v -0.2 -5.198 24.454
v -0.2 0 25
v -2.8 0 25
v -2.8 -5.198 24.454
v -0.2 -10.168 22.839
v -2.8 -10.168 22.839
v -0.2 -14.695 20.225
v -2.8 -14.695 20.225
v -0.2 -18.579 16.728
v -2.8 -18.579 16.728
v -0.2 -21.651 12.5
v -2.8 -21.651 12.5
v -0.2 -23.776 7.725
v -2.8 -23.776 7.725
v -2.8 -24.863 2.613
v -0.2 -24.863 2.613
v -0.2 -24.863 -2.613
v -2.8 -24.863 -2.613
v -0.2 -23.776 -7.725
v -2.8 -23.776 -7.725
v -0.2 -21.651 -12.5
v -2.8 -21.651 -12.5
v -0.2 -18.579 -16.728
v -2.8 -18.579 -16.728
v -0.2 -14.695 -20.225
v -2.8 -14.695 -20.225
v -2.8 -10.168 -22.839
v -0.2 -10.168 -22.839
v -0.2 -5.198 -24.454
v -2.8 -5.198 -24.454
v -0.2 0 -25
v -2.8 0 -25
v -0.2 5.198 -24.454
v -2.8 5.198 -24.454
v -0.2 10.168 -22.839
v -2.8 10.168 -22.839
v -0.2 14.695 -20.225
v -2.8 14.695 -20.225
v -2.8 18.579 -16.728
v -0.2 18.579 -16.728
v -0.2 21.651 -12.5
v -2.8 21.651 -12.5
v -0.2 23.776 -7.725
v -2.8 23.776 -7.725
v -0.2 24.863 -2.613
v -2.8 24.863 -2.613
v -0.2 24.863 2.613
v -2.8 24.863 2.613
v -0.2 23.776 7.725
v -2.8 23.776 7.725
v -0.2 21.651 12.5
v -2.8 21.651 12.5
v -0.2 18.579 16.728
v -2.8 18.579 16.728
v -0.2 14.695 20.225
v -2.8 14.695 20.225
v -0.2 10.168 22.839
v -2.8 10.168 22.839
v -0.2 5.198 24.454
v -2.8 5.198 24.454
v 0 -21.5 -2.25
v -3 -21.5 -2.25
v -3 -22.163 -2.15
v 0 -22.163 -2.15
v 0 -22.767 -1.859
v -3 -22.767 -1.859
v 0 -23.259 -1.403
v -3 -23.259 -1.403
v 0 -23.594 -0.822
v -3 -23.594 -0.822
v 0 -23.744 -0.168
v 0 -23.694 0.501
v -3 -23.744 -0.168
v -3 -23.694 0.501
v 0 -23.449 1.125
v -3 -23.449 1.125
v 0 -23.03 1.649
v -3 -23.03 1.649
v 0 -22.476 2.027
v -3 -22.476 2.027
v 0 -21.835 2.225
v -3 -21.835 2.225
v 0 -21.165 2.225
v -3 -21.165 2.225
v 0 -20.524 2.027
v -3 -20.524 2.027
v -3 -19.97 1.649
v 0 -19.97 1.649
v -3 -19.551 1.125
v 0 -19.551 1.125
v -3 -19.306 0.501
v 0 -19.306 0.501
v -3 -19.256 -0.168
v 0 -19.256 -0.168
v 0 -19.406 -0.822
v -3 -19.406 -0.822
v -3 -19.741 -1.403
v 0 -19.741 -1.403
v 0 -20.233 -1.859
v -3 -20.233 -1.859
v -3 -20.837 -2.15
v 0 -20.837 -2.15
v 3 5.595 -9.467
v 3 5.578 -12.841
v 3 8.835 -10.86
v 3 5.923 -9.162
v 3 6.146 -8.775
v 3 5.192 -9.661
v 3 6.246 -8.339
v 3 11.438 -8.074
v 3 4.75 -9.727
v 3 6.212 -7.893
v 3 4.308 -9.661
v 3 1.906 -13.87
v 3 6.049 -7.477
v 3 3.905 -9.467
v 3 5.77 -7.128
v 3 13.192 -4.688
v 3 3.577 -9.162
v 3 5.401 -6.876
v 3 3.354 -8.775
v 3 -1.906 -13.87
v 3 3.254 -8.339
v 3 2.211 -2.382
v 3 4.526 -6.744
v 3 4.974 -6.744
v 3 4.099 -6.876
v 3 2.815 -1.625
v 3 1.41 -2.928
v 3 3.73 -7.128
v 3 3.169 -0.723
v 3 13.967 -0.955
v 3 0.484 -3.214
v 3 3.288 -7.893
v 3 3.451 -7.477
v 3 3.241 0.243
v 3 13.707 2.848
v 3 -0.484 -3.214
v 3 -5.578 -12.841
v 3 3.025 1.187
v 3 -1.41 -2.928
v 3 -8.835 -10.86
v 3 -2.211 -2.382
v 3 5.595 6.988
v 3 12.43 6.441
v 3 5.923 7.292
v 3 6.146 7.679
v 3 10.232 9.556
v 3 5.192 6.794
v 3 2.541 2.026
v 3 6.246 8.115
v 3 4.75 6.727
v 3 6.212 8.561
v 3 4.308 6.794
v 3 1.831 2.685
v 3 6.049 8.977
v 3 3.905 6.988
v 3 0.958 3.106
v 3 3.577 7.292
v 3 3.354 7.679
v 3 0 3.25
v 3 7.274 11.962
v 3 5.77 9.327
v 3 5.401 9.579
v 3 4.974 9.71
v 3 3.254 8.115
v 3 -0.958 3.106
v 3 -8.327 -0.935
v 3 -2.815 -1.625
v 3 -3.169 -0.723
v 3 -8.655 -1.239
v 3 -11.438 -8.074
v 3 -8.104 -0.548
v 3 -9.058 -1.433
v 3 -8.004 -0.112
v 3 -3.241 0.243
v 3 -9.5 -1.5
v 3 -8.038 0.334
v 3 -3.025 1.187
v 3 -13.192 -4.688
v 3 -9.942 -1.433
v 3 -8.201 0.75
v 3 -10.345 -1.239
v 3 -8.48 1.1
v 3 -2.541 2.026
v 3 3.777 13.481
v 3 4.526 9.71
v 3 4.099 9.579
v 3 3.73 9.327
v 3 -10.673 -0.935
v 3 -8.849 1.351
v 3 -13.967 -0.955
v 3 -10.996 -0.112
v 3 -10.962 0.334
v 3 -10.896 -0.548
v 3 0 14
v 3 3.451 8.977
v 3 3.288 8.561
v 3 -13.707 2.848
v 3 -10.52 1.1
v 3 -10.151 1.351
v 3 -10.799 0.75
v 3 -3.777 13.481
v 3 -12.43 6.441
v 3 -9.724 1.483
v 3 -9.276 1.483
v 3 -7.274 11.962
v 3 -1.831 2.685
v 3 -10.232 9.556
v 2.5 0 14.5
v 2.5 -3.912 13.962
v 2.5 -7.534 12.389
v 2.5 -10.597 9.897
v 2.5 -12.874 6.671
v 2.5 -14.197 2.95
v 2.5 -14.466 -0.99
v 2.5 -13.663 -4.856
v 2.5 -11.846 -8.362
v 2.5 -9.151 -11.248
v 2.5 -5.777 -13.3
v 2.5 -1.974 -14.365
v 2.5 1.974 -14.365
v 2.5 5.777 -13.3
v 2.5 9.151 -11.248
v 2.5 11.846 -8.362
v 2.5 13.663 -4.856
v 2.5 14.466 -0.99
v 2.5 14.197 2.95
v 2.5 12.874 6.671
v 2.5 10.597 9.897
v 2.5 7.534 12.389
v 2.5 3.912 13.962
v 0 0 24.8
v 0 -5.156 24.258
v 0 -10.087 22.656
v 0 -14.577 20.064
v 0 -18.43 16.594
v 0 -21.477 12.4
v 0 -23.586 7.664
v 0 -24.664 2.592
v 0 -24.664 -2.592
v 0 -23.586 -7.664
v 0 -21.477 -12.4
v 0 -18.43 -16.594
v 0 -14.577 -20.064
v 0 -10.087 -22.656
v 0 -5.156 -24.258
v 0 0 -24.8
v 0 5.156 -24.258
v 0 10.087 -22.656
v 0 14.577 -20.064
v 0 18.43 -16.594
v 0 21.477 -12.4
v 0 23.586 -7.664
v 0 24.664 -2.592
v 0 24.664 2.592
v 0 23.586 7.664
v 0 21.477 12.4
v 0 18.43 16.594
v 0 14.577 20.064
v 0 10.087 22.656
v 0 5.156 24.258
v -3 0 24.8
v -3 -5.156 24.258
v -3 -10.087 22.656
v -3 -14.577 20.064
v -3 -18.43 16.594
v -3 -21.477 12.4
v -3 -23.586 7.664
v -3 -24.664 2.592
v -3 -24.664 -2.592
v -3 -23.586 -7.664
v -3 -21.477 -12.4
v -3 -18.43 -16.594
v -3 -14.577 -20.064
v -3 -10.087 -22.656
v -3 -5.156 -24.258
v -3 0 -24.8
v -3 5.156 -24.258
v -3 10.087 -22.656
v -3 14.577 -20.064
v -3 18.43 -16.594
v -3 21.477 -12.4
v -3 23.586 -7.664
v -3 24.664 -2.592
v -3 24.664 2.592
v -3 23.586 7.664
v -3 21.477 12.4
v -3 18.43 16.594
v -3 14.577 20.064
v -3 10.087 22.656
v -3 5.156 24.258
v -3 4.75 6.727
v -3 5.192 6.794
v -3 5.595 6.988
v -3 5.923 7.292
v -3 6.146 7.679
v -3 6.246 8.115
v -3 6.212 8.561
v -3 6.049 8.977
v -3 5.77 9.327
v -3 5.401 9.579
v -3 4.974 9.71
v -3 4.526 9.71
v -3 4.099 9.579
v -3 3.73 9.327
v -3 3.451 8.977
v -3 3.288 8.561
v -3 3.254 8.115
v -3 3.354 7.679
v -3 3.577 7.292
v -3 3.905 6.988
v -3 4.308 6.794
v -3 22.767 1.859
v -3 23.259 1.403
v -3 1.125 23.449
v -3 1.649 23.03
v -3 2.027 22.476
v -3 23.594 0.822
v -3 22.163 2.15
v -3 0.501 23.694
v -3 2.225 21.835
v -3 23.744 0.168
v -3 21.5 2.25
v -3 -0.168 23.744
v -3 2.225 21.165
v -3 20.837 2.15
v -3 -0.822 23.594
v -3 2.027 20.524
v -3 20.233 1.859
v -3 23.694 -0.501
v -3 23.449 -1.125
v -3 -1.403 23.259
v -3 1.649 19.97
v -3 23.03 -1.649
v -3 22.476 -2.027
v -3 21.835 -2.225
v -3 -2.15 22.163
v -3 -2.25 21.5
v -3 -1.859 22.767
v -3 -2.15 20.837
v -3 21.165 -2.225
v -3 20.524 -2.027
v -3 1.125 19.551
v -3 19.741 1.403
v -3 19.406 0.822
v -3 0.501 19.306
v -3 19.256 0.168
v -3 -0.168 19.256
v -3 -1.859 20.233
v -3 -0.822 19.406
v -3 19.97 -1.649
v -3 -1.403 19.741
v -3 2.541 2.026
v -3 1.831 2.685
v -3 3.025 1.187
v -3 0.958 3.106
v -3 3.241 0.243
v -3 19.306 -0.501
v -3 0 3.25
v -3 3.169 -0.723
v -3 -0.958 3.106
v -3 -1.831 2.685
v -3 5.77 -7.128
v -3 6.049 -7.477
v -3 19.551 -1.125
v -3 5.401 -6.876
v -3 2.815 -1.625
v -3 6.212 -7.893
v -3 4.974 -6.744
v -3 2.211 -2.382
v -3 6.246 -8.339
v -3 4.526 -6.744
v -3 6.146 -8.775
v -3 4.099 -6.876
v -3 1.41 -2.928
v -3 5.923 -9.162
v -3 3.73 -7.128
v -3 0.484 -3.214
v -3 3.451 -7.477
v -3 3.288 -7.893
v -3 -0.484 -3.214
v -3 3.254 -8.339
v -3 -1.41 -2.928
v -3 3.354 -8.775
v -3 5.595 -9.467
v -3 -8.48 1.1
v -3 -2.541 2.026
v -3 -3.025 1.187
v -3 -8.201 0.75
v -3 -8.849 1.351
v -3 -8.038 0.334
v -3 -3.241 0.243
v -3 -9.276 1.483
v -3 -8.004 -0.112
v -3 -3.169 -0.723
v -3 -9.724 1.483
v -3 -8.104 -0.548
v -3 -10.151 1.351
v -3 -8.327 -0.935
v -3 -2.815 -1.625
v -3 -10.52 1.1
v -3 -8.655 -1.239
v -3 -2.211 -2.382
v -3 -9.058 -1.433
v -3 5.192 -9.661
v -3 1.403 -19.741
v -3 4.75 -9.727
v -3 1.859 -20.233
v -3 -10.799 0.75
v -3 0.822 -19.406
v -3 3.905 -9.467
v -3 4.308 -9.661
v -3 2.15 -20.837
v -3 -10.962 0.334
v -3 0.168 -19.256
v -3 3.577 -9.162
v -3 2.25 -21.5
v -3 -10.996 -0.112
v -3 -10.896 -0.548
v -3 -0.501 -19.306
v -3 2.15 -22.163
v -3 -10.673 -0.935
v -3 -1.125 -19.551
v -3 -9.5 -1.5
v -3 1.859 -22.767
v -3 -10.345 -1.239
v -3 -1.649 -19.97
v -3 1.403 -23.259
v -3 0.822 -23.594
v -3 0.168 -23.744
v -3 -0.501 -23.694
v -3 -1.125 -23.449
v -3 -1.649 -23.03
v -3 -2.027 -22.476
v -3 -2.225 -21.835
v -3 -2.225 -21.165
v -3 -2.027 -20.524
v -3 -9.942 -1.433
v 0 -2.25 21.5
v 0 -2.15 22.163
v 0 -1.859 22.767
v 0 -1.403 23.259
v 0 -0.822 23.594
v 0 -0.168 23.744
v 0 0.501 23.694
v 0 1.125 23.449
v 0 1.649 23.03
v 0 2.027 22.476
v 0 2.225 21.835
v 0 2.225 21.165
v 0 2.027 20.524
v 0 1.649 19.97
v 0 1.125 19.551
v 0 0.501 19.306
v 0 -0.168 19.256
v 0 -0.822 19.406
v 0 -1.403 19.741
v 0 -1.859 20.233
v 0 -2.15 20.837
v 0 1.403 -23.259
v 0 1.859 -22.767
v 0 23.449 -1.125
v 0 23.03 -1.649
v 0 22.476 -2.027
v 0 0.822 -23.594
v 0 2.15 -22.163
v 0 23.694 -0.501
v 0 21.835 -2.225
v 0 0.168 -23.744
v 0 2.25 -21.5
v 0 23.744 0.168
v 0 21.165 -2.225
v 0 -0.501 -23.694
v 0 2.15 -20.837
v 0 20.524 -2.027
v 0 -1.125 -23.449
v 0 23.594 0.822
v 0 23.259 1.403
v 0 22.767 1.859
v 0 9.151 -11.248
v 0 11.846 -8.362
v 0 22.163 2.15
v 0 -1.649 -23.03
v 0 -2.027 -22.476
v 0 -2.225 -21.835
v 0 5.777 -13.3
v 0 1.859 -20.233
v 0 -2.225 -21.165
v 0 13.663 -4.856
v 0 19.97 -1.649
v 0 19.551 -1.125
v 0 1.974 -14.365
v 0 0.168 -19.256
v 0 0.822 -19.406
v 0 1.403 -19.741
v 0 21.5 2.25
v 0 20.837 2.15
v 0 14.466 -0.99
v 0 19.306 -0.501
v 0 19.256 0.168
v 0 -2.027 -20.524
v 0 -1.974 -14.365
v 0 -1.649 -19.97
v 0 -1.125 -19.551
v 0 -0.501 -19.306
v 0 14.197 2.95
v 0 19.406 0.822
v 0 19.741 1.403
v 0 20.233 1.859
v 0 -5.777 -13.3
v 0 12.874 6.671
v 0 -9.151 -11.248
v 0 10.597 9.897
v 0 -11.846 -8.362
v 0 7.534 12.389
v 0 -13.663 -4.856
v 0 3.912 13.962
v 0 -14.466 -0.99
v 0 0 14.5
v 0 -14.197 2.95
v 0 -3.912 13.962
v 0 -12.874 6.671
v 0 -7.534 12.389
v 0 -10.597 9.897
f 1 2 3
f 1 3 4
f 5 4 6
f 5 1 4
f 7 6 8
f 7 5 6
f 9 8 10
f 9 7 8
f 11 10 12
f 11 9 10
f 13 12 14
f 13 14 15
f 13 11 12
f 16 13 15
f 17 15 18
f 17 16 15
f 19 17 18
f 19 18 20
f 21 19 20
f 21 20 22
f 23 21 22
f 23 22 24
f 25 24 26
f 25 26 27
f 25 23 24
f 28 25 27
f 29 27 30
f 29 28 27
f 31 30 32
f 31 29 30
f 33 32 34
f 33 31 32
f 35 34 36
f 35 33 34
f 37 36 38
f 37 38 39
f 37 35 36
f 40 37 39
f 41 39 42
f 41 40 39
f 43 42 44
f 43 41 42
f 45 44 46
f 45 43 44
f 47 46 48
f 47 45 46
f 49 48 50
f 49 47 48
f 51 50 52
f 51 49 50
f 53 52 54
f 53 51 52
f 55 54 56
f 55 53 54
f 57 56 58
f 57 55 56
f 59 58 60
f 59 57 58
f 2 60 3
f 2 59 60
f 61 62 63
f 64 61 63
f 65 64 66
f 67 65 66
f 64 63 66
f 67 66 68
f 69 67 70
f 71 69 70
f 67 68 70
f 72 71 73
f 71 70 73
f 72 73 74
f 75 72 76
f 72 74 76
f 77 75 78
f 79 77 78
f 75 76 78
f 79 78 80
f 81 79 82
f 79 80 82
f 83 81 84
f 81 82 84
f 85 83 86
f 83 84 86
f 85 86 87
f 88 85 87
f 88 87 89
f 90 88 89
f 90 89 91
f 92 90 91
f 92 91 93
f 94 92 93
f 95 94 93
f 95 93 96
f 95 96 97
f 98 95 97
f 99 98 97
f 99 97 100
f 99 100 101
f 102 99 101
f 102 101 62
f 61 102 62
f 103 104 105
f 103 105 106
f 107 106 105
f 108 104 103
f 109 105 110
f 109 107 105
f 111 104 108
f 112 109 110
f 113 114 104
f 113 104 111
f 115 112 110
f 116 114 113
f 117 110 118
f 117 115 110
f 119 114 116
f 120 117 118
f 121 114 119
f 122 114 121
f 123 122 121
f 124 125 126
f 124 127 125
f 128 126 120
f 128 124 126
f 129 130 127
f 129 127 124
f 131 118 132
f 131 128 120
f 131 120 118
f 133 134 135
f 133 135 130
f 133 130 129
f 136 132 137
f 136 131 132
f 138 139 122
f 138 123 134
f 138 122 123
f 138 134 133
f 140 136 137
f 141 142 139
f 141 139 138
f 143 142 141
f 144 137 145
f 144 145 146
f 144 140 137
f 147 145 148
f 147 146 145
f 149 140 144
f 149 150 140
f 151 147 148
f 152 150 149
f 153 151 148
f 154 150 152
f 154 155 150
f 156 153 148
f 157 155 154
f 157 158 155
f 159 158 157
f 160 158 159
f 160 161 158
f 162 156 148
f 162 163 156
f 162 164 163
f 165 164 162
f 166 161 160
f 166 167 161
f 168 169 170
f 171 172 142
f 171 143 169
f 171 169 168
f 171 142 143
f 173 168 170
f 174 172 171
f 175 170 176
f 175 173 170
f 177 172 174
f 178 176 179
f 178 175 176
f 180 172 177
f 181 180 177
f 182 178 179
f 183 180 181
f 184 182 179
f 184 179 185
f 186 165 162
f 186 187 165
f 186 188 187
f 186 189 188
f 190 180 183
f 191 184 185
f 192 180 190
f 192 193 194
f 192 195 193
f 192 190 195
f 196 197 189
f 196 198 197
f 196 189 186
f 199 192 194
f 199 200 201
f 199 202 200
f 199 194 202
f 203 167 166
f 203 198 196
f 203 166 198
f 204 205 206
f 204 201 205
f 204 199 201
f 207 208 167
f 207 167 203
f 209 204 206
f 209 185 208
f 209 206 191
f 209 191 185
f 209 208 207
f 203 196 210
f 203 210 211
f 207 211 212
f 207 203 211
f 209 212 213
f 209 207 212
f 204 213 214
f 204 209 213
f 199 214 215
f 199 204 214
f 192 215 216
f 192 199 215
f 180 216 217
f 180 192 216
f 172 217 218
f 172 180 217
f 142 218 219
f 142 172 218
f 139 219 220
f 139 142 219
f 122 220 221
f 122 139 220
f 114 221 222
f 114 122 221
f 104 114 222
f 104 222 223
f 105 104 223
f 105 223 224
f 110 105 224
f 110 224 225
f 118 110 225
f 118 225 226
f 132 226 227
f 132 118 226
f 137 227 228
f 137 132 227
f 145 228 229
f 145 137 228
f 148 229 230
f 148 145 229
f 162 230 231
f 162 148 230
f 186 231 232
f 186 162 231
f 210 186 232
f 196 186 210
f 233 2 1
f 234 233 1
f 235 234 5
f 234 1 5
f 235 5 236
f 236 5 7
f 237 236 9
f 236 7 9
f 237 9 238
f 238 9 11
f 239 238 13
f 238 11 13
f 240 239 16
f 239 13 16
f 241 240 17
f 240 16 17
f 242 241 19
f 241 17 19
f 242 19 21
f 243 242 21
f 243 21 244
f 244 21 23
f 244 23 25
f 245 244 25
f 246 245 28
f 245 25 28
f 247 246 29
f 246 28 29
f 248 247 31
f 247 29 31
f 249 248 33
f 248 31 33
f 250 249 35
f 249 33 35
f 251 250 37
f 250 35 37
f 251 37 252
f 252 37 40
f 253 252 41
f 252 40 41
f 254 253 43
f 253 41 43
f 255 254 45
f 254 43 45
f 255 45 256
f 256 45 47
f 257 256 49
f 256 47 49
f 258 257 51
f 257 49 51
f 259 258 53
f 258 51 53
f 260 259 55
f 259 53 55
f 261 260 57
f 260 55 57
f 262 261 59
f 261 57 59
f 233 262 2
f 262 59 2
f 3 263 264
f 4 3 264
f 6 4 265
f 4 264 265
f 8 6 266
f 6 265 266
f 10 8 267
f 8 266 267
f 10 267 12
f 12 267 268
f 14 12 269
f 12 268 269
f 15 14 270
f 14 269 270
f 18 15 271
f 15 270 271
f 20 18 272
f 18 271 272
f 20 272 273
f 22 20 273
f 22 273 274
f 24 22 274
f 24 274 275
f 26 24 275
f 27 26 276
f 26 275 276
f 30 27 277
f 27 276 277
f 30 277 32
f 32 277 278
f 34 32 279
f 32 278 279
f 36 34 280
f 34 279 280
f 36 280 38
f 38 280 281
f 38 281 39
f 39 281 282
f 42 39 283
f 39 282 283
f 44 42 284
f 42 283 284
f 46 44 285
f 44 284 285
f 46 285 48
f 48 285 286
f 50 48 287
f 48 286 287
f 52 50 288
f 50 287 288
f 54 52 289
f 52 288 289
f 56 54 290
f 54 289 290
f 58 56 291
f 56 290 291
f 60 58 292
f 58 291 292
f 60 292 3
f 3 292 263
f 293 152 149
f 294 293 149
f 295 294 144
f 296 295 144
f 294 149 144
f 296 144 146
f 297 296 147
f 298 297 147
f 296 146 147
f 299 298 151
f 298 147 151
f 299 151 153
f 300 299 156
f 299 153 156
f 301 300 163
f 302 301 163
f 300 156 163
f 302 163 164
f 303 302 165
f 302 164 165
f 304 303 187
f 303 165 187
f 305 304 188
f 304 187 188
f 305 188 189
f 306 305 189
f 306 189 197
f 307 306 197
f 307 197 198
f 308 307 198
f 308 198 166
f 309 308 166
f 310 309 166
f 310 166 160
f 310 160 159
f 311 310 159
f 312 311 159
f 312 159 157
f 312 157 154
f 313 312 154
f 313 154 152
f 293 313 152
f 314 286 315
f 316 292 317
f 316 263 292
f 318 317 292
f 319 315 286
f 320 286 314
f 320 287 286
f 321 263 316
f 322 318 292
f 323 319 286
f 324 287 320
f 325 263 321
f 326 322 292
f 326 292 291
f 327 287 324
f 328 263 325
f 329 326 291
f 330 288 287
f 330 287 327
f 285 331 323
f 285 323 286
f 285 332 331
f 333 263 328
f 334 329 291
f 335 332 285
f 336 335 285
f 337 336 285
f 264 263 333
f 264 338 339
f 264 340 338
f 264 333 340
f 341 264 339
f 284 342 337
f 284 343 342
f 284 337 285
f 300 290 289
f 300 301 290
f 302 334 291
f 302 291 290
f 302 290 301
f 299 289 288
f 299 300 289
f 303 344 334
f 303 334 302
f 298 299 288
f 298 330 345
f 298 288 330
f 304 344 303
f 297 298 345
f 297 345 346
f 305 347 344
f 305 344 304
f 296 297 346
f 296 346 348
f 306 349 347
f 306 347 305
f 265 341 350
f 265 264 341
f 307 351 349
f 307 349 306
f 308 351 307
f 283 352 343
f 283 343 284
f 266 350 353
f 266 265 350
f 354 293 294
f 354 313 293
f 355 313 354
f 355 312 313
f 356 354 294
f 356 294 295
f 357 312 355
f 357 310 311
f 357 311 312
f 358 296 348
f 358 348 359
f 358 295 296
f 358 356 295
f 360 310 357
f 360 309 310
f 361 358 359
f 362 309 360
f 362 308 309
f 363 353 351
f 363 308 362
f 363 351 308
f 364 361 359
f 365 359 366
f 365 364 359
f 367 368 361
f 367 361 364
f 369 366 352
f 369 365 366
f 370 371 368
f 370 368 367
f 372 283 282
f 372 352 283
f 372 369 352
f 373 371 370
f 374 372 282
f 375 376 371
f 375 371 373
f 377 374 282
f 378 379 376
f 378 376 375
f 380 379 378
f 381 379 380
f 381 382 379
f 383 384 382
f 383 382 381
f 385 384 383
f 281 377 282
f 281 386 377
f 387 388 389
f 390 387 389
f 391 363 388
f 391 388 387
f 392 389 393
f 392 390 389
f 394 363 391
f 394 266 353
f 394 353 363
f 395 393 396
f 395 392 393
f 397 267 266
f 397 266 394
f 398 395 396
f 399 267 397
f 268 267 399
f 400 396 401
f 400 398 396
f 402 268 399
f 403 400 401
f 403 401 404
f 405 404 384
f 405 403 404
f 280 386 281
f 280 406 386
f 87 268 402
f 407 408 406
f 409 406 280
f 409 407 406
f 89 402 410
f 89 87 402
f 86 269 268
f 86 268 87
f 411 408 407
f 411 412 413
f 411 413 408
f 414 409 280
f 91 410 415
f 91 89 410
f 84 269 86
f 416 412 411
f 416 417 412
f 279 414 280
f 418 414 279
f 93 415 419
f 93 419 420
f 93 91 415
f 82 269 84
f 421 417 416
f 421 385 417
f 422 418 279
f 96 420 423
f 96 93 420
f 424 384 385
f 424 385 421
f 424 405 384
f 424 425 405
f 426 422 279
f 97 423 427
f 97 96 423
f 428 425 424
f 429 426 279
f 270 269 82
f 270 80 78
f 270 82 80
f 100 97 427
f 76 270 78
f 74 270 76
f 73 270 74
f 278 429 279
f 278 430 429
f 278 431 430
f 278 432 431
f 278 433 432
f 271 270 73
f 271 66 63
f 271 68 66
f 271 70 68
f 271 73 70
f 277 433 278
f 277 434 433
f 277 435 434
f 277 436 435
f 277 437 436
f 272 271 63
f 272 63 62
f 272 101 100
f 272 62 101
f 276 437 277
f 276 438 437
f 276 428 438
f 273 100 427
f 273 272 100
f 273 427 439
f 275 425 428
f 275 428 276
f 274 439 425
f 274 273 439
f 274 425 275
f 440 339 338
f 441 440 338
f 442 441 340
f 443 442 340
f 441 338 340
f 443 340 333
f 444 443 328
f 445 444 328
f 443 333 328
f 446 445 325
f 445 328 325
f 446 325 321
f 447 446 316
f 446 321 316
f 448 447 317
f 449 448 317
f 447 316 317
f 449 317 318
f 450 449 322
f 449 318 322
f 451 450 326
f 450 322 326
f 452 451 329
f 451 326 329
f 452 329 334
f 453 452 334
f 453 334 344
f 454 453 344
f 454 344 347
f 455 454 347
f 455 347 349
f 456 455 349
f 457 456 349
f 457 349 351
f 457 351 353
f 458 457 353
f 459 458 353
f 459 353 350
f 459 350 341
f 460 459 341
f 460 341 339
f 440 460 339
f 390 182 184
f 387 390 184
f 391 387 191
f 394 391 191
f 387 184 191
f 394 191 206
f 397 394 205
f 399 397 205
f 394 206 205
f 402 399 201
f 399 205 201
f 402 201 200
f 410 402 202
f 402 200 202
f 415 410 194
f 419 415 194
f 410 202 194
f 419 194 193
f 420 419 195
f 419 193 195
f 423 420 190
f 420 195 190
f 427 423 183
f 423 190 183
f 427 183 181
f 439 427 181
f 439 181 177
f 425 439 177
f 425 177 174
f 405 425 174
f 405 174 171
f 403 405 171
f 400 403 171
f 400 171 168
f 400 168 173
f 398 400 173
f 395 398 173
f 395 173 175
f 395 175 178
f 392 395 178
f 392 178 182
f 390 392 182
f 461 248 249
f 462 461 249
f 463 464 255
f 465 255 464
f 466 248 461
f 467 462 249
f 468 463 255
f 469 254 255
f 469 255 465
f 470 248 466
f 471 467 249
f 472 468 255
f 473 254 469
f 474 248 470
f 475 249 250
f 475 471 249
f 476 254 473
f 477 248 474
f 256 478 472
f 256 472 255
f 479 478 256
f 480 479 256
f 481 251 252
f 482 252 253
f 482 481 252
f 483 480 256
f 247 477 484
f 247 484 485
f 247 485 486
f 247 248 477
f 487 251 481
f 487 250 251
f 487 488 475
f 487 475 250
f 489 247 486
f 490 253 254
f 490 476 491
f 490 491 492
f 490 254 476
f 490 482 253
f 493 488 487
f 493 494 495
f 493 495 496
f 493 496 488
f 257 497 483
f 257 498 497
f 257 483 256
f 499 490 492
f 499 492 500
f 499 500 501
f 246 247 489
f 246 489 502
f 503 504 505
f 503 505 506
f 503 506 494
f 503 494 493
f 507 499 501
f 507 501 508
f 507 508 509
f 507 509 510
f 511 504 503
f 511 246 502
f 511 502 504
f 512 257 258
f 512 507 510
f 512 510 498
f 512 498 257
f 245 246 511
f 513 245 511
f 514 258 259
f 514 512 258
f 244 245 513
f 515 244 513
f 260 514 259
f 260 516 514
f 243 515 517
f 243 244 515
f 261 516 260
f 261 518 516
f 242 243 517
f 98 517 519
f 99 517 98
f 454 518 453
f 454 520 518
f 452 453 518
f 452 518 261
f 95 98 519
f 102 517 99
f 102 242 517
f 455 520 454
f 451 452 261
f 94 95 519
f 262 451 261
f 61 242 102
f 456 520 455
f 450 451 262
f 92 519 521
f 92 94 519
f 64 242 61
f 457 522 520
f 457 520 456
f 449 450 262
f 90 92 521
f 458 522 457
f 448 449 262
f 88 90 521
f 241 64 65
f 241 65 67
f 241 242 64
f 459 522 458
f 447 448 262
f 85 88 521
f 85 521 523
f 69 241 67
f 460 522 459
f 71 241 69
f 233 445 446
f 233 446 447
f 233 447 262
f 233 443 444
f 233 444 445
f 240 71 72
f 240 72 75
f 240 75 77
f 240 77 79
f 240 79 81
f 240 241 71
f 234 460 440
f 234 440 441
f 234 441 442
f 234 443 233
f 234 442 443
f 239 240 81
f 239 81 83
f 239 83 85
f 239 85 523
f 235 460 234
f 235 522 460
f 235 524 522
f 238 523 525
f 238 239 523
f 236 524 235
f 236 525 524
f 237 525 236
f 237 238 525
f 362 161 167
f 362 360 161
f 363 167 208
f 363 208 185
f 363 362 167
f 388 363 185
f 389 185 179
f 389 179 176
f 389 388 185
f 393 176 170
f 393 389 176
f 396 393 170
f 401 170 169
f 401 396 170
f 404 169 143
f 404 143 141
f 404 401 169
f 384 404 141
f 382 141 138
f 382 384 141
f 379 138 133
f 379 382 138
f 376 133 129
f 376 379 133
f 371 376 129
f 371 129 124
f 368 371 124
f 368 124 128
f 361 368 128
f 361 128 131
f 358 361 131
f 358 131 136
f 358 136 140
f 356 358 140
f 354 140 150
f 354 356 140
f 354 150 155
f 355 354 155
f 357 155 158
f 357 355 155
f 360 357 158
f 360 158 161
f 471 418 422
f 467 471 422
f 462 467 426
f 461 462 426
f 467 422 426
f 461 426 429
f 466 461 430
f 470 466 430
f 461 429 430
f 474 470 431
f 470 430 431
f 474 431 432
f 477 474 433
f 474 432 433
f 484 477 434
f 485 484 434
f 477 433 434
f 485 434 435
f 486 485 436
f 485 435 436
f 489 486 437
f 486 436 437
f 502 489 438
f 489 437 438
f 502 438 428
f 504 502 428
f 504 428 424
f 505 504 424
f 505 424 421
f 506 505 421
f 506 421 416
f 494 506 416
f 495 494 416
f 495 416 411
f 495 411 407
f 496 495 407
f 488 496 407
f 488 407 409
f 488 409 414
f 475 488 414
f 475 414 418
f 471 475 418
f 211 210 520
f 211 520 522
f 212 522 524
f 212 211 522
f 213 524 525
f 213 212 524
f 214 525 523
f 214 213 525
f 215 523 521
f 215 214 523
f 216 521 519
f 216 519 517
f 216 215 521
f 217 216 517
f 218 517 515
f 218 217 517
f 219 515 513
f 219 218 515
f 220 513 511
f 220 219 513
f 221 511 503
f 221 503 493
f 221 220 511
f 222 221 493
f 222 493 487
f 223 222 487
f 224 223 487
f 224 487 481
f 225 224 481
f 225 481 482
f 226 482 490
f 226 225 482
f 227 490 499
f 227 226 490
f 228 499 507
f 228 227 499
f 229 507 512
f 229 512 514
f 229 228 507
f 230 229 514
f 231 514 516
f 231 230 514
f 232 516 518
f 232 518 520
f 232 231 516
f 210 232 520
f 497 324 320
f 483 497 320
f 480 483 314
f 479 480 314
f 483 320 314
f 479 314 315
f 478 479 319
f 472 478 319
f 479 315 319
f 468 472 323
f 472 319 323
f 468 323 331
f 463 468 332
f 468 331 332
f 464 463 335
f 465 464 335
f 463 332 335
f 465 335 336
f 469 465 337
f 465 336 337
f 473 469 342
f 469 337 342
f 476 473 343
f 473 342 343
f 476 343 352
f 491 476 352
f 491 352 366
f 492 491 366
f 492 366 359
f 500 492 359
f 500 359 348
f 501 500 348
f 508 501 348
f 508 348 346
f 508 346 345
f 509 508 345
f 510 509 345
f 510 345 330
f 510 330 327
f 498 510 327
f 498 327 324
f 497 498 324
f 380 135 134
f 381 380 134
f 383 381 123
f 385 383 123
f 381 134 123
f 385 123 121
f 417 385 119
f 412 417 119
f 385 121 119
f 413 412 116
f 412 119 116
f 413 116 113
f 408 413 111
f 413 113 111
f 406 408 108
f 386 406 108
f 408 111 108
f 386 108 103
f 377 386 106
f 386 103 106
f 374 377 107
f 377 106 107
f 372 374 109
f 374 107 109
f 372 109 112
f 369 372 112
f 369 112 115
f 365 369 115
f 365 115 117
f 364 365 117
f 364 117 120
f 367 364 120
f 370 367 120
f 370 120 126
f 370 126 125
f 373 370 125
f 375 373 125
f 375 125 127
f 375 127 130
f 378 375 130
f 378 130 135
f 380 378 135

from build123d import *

# Parameters (mm, degrees)
CHANFREIN1_SIZE                    = 0.5
CHANFREIN2_SIZE                    = 0.2
ESQUISSE2_R                        = 1.5
TROU_DE_FIXATION_DU_MOTEUR_DEPTH   = 36.860842154
R_P_TITION_DES_3_TROUS_COUNT       = 3
ESQUISSE3_R                        = 2.25
TROU_DE_FIXATION_DE_LA_BRIDE_DEPTH = 36.860842154
R_P_TITION_DES_4_TROUS_COUNT       = 4


with BuildPart() as part:
    # Esquisse1 → Base-Révolution (revolve)
    with BuildSketch(Plane.XY):
        Polygon((-3, 3.25), (-3, 25), (0, 25), (0, 14.5), (3, 14.5), (3, 3.25), align=None)
    revolve(axis=Axis((-30.73022942, 0, 0), (1, 0, 0)))

    # Chanfrein1
    chanfrein1_edges = [part.edges().sort_by_distance(p)[0] for p in [
        (3, -14.5, 0),
    ]]
    chamfer(chanfrein1_edges, length=CHANFREIN1_SIZE)

    # Chanfrein2
    chanfrein2_edges = [part.edges().sort_by_distance(p)[0] for p in [
        (-3, -25, 0),
        (0, -25, 0),
    ]]
    chamfer(chanfrein2_edges, length=CHANFREIN2_SIZE)

    # Esquisse2 → Trou de fixation du moteur (cut, through all)
    with BuildSketch(Plane(origin=(3, 0, 0), x_dir=(0, 0, -1), z_dir=(1, 0, 0))):
        with Locations((-8.227241336, 4.75)):
            Circle(ESQUISSE2_R)
    trou_de_fixation_du_moteur = extrude(amount=-TROU_DE_FIXATION_DU_MOTEUR_DEPTH, mode=Mode.SUBTRACT)

    # Répétition des 3 trous: Trou de fixation du moteur ×3 about axis
    r_p_tition_des_3_trous_axis = Axis((19.26977058, 0, 0), (-1, 0, 0))
    for i in range(1, R_P_TITION_DES_3_TROUS_COUNT):
        add(trou_de_fixation_du_moteur.rotate(r_p_tition_des_3_trous_axis, i * 360 / R_P_TITION_DES_3_TROUS_COUNT), mode=Mode.SUBTRACT)

    # Esquisse3 → Trou de fixation de la bride (cut, through all)
    with BuildSketch(Plane.ZY.offset(3)):
        with Locations((0, 21.5)):
            Circle(ESQUISSE3_R)
    trou_de_fixation_de_la_bride = extrude(amount=-TROU_DE_FIXATION_DE_LA_BRIDE_DEPTH, mode=Mode.SUBTRACT)

    # Répétition des 4 trous: Trou de fixation de la bride ×4 about axis
    r_p_tition_des_4_trous_axis = Axis((19.26977058, 0, 0), (-1, 0, 0))
    for i in range(1, R_P_TITION_DES_4_TROUS_COUNT):
        add(trou_de_fixation_de_la_bride.rotate(r_p_tition_des_4_trous_axis, i * 360 / R_P_TITION_DES_4_TROUS_COUNT), mode=Mode.SUBTRACT)


solid = part.part
